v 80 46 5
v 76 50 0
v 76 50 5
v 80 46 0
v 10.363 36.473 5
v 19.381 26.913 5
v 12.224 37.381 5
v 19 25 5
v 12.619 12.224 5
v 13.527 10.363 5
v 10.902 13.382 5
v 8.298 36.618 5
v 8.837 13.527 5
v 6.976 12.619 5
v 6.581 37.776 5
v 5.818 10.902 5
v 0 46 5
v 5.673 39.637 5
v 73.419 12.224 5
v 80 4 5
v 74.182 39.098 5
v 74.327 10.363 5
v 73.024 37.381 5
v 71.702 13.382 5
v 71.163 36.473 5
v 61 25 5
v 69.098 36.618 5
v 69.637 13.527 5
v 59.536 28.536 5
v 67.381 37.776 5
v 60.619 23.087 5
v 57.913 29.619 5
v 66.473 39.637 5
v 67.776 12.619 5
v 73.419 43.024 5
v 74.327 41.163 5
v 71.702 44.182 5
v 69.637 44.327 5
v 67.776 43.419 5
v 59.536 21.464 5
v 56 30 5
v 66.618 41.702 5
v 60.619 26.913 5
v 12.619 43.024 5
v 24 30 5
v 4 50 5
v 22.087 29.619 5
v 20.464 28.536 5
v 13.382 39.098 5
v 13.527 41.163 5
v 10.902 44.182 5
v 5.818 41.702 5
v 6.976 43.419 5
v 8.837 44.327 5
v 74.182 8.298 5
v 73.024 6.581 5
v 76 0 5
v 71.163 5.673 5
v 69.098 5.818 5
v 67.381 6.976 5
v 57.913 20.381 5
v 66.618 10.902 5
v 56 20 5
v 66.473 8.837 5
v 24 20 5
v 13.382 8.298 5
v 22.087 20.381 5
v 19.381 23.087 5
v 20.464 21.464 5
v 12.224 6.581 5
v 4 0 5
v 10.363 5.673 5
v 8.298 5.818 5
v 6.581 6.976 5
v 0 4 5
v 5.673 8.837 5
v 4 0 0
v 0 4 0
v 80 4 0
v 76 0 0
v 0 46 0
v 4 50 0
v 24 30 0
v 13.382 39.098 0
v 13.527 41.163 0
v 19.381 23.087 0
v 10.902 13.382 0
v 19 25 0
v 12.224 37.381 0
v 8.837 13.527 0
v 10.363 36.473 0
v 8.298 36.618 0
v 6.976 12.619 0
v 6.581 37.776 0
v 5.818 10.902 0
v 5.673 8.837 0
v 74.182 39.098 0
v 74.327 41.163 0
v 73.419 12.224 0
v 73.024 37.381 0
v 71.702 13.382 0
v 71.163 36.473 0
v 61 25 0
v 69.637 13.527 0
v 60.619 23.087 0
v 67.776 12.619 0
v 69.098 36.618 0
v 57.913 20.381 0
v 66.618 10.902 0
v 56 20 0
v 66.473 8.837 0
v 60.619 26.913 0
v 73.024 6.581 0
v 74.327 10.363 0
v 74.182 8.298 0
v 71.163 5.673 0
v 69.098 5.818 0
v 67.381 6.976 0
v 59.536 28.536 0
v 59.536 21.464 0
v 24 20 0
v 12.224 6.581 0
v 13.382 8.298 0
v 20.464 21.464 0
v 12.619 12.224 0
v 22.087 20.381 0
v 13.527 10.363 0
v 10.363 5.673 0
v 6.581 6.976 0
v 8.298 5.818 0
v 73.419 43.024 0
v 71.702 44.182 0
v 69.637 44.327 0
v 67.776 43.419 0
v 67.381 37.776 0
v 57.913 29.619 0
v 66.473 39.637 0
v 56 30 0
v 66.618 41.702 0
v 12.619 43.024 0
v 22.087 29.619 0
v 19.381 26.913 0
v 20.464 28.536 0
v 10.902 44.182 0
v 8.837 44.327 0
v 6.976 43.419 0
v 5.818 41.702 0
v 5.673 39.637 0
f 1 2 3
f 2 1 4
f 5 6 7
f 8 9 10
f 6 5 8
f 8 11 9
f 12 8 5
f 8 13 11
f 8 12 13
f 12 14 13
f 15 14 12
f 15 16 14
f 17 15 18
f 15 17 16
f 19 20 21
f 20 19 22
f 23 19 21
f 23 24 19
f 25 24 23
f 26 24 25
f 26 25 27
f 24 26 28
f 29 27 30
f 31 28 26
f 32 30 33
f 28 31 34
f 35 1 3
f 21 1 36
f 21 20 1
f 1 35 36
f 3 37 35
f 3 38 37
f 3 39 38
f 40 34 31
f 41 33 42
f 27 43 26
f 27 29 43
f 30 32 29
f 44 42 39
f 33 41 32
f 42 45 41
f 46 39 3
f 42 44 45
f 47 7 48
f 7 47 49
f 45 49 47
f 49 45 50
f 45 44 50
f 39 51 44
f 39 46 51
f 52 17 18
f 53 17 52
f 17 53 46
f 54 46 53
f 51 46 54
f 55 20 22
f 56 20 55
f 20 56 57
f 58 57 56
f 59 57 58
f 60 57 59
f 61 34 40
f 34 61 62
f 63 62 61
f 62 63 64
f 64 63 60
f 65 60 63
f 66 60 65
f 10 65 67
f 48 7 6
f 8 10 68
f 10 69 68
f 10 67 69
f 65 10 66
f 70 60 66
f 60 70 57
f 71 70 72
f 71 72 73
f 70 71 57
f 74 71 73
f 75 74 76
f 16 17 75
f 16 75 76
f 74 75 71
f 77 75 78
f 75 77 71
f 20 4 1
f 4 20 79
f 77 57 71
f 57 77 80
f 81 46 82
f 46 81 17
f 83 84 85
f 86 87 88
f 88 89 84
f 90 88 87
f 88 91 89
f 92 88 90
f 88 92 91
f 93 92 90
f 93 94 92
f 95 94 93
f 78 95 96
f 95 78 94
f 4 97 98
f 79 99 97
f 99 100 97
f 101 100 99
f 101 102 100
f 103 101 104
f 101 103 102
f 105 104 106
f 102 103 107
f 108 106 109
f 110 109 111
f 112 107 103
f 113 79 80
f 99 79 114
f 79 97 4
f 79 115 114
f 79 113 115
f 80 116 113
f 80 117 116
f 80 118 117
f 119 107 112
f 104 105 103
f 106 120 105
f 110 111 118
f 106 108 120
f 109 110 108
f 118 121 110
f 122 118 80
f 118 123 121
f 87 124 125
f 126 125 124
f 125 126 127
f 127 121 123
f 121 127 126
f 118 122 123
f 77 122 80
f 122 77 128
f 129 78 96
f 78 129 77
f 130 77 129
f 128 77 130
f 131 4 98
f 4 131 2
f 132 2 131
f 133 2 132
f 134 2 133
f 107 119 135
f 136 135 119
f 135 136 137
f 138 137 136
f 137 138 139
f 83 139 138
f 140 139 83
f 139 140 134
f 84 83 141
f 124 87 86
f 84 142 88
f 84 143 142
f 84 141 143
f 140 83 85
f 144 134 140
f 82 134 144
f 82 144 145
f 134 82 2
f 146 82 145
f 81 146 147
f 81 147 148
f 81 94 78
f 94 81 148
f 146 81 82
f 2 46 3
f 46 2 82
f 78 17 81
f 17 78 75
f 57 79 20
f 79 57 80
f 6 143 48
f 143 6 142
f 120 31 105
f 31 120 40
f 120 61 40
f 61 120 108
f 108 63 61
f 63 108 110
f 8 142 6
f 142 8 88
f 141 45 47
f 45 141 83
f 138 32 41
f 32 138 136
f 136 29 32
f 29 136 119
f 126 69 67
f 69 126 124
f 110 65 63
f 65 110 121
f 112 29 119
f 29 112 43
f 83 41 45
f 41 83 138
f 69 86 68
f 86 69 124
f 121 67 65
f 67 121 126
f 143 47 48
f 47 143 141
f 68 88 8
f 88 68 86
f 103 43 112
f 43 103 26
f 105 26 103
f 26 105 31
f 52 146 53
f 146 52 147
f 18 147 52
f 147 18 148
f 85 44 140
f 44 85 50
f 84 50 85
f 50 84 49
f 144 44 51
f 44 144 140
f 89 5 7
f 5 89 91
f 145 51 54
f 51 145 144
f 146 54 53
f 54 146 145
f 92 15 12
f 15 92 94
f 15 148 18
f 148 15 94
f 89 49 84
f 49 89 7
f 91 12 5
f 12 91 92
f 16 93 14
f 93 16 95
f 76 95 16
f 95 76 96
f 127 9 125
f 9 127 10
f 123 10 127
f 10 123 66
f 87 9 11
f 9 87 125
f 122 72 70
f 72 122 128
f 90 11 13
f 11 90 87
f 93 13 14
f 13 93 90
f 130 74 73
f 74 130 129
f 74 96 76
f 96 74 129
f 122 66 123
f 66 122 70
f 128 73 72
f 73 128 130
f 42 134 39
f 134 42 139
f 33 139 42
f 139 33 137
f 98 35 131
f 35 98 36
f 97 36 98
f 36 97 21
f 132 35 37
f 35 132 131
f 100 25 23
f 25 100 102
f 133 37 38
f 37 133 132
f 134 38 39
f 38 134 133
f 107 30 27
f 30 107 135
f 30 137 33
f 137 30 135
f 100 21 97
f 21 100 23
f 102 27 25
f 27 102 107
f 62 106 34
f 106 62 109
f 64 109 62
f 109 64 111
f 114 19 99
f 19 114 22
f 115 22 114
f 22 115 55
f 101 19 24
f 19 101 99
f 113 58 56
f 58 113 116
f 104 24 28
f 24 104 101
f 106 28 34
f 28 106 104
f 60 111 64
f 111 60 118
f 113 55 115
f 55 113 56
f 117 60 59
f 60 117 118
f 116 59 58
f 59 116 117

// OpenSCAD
$fn = 32;

// ----------------------------------------------------------------------
// Bracket plate: slot plate 80 x 50
// ----------------------------------------------------------------------

// --- parameters (mm) ---
hole_r = 4;               // bolt hole radius
plate_t = 5;              // plate thickness, Z (extrusion height)
plate_l = 80;             // plate length
plate_w = 50;             // plate width
slot_l = 32;              // slot straight length
slot_r = 5;               // slot end radius

slot_len = slot_l + 2 * slot_r;
slot_w = 2 * slot_r;
hole_d2 = 2 * hole_r;

profile = [[4, 0], [76, 0], [80, 4], [80, 46], [76, 50], [4, 50], [0, 46], [0, 4]];  // primary outline, 8 points, counter clockwise
void_1 = [[56, 20], [57.913, 20.381], [59.536, 21.464], [60.619, 23.087], [61, 25], [60.619, 26.913], [59.536, 28.536], [57.913, 29.619], [56, 30], [24, 30], [22.087, 29.619], [20.464, 28.536], [19.381, 26.913], [19, 25], [19.381, 23.087], [20.464, 21.464], [22.087, 20.381], [24, 20]];  // grip slot, 18 points
void_2 = [[13.527, 41.163], [12.619, 43.024], [10.902, 44.182], [8.837, 44.327], [6.976, 43.419], [5.818, 41.702], [5.673, 39.637], [6.581, 37.776], [8.298, 36.618], [10.363, 36.473], [12.224, 37.381], [13.382, 39.098]];  // corner hole, 12 points
void_3 = [[13.527, 10.363], [12.619, 12.224], [10.902, 13.382], [8.837, 13.527], [6.976, 12.619], [5.818, 10.902], [5.673, 8.837], [6.581, 6.976], [8.298, 5.818], [10.363, 5.673], [12.224, 6.581], [13.382, 8.298]];  // corner hole, 12 points
void_4 = [[74.327, 41.163], [73.419, 43.024], [71.702, 44.182], [69.637, 44.327], [67.776, 43.419], [66.618, 41.702], [66.473, 39.637], [67.381, 37.776], [69.098, 36.618], [71.163, 36.473], [73.024, 37.381], [74.182, 39.098]];  // corner hole, 12 points
void_5 = [[74.327, 10.363], [73.419, 12.224], [71.702, 13.382], [69.637, 13.527], [67.776, 12.619], [66.618, 10.902], [66.473, 8.837], [67.381, 6.976], [69.098, 5.818], [71.163, 5.673], [73.024, 6.581], [74.182, 8.298]];  // corner hole, 12 points

// --- the one profile operation ---
difference() {
  linear_extrude(height = plate_t) polygon(points = profile);
  translate([0, 0, -1])
    linear_extrude(height = plate_t + 2) polygon(points = void_1);
  translate([0, 0, -1])
    linear_extrude(height = plate_t + 2) polygon(points = void_2);
  translate([0, 0, -1])
    linear_extrude(height = plate_t + 2) polygon(points = void_3);
  translate([0, 0, -1])
    linear_extrude(height = plate_t + 2) polygon(points = void_4);
  translate([0, 0, -1])
    linear_extrude(height = plate_t + 2) polygon(points = void_5);
}
